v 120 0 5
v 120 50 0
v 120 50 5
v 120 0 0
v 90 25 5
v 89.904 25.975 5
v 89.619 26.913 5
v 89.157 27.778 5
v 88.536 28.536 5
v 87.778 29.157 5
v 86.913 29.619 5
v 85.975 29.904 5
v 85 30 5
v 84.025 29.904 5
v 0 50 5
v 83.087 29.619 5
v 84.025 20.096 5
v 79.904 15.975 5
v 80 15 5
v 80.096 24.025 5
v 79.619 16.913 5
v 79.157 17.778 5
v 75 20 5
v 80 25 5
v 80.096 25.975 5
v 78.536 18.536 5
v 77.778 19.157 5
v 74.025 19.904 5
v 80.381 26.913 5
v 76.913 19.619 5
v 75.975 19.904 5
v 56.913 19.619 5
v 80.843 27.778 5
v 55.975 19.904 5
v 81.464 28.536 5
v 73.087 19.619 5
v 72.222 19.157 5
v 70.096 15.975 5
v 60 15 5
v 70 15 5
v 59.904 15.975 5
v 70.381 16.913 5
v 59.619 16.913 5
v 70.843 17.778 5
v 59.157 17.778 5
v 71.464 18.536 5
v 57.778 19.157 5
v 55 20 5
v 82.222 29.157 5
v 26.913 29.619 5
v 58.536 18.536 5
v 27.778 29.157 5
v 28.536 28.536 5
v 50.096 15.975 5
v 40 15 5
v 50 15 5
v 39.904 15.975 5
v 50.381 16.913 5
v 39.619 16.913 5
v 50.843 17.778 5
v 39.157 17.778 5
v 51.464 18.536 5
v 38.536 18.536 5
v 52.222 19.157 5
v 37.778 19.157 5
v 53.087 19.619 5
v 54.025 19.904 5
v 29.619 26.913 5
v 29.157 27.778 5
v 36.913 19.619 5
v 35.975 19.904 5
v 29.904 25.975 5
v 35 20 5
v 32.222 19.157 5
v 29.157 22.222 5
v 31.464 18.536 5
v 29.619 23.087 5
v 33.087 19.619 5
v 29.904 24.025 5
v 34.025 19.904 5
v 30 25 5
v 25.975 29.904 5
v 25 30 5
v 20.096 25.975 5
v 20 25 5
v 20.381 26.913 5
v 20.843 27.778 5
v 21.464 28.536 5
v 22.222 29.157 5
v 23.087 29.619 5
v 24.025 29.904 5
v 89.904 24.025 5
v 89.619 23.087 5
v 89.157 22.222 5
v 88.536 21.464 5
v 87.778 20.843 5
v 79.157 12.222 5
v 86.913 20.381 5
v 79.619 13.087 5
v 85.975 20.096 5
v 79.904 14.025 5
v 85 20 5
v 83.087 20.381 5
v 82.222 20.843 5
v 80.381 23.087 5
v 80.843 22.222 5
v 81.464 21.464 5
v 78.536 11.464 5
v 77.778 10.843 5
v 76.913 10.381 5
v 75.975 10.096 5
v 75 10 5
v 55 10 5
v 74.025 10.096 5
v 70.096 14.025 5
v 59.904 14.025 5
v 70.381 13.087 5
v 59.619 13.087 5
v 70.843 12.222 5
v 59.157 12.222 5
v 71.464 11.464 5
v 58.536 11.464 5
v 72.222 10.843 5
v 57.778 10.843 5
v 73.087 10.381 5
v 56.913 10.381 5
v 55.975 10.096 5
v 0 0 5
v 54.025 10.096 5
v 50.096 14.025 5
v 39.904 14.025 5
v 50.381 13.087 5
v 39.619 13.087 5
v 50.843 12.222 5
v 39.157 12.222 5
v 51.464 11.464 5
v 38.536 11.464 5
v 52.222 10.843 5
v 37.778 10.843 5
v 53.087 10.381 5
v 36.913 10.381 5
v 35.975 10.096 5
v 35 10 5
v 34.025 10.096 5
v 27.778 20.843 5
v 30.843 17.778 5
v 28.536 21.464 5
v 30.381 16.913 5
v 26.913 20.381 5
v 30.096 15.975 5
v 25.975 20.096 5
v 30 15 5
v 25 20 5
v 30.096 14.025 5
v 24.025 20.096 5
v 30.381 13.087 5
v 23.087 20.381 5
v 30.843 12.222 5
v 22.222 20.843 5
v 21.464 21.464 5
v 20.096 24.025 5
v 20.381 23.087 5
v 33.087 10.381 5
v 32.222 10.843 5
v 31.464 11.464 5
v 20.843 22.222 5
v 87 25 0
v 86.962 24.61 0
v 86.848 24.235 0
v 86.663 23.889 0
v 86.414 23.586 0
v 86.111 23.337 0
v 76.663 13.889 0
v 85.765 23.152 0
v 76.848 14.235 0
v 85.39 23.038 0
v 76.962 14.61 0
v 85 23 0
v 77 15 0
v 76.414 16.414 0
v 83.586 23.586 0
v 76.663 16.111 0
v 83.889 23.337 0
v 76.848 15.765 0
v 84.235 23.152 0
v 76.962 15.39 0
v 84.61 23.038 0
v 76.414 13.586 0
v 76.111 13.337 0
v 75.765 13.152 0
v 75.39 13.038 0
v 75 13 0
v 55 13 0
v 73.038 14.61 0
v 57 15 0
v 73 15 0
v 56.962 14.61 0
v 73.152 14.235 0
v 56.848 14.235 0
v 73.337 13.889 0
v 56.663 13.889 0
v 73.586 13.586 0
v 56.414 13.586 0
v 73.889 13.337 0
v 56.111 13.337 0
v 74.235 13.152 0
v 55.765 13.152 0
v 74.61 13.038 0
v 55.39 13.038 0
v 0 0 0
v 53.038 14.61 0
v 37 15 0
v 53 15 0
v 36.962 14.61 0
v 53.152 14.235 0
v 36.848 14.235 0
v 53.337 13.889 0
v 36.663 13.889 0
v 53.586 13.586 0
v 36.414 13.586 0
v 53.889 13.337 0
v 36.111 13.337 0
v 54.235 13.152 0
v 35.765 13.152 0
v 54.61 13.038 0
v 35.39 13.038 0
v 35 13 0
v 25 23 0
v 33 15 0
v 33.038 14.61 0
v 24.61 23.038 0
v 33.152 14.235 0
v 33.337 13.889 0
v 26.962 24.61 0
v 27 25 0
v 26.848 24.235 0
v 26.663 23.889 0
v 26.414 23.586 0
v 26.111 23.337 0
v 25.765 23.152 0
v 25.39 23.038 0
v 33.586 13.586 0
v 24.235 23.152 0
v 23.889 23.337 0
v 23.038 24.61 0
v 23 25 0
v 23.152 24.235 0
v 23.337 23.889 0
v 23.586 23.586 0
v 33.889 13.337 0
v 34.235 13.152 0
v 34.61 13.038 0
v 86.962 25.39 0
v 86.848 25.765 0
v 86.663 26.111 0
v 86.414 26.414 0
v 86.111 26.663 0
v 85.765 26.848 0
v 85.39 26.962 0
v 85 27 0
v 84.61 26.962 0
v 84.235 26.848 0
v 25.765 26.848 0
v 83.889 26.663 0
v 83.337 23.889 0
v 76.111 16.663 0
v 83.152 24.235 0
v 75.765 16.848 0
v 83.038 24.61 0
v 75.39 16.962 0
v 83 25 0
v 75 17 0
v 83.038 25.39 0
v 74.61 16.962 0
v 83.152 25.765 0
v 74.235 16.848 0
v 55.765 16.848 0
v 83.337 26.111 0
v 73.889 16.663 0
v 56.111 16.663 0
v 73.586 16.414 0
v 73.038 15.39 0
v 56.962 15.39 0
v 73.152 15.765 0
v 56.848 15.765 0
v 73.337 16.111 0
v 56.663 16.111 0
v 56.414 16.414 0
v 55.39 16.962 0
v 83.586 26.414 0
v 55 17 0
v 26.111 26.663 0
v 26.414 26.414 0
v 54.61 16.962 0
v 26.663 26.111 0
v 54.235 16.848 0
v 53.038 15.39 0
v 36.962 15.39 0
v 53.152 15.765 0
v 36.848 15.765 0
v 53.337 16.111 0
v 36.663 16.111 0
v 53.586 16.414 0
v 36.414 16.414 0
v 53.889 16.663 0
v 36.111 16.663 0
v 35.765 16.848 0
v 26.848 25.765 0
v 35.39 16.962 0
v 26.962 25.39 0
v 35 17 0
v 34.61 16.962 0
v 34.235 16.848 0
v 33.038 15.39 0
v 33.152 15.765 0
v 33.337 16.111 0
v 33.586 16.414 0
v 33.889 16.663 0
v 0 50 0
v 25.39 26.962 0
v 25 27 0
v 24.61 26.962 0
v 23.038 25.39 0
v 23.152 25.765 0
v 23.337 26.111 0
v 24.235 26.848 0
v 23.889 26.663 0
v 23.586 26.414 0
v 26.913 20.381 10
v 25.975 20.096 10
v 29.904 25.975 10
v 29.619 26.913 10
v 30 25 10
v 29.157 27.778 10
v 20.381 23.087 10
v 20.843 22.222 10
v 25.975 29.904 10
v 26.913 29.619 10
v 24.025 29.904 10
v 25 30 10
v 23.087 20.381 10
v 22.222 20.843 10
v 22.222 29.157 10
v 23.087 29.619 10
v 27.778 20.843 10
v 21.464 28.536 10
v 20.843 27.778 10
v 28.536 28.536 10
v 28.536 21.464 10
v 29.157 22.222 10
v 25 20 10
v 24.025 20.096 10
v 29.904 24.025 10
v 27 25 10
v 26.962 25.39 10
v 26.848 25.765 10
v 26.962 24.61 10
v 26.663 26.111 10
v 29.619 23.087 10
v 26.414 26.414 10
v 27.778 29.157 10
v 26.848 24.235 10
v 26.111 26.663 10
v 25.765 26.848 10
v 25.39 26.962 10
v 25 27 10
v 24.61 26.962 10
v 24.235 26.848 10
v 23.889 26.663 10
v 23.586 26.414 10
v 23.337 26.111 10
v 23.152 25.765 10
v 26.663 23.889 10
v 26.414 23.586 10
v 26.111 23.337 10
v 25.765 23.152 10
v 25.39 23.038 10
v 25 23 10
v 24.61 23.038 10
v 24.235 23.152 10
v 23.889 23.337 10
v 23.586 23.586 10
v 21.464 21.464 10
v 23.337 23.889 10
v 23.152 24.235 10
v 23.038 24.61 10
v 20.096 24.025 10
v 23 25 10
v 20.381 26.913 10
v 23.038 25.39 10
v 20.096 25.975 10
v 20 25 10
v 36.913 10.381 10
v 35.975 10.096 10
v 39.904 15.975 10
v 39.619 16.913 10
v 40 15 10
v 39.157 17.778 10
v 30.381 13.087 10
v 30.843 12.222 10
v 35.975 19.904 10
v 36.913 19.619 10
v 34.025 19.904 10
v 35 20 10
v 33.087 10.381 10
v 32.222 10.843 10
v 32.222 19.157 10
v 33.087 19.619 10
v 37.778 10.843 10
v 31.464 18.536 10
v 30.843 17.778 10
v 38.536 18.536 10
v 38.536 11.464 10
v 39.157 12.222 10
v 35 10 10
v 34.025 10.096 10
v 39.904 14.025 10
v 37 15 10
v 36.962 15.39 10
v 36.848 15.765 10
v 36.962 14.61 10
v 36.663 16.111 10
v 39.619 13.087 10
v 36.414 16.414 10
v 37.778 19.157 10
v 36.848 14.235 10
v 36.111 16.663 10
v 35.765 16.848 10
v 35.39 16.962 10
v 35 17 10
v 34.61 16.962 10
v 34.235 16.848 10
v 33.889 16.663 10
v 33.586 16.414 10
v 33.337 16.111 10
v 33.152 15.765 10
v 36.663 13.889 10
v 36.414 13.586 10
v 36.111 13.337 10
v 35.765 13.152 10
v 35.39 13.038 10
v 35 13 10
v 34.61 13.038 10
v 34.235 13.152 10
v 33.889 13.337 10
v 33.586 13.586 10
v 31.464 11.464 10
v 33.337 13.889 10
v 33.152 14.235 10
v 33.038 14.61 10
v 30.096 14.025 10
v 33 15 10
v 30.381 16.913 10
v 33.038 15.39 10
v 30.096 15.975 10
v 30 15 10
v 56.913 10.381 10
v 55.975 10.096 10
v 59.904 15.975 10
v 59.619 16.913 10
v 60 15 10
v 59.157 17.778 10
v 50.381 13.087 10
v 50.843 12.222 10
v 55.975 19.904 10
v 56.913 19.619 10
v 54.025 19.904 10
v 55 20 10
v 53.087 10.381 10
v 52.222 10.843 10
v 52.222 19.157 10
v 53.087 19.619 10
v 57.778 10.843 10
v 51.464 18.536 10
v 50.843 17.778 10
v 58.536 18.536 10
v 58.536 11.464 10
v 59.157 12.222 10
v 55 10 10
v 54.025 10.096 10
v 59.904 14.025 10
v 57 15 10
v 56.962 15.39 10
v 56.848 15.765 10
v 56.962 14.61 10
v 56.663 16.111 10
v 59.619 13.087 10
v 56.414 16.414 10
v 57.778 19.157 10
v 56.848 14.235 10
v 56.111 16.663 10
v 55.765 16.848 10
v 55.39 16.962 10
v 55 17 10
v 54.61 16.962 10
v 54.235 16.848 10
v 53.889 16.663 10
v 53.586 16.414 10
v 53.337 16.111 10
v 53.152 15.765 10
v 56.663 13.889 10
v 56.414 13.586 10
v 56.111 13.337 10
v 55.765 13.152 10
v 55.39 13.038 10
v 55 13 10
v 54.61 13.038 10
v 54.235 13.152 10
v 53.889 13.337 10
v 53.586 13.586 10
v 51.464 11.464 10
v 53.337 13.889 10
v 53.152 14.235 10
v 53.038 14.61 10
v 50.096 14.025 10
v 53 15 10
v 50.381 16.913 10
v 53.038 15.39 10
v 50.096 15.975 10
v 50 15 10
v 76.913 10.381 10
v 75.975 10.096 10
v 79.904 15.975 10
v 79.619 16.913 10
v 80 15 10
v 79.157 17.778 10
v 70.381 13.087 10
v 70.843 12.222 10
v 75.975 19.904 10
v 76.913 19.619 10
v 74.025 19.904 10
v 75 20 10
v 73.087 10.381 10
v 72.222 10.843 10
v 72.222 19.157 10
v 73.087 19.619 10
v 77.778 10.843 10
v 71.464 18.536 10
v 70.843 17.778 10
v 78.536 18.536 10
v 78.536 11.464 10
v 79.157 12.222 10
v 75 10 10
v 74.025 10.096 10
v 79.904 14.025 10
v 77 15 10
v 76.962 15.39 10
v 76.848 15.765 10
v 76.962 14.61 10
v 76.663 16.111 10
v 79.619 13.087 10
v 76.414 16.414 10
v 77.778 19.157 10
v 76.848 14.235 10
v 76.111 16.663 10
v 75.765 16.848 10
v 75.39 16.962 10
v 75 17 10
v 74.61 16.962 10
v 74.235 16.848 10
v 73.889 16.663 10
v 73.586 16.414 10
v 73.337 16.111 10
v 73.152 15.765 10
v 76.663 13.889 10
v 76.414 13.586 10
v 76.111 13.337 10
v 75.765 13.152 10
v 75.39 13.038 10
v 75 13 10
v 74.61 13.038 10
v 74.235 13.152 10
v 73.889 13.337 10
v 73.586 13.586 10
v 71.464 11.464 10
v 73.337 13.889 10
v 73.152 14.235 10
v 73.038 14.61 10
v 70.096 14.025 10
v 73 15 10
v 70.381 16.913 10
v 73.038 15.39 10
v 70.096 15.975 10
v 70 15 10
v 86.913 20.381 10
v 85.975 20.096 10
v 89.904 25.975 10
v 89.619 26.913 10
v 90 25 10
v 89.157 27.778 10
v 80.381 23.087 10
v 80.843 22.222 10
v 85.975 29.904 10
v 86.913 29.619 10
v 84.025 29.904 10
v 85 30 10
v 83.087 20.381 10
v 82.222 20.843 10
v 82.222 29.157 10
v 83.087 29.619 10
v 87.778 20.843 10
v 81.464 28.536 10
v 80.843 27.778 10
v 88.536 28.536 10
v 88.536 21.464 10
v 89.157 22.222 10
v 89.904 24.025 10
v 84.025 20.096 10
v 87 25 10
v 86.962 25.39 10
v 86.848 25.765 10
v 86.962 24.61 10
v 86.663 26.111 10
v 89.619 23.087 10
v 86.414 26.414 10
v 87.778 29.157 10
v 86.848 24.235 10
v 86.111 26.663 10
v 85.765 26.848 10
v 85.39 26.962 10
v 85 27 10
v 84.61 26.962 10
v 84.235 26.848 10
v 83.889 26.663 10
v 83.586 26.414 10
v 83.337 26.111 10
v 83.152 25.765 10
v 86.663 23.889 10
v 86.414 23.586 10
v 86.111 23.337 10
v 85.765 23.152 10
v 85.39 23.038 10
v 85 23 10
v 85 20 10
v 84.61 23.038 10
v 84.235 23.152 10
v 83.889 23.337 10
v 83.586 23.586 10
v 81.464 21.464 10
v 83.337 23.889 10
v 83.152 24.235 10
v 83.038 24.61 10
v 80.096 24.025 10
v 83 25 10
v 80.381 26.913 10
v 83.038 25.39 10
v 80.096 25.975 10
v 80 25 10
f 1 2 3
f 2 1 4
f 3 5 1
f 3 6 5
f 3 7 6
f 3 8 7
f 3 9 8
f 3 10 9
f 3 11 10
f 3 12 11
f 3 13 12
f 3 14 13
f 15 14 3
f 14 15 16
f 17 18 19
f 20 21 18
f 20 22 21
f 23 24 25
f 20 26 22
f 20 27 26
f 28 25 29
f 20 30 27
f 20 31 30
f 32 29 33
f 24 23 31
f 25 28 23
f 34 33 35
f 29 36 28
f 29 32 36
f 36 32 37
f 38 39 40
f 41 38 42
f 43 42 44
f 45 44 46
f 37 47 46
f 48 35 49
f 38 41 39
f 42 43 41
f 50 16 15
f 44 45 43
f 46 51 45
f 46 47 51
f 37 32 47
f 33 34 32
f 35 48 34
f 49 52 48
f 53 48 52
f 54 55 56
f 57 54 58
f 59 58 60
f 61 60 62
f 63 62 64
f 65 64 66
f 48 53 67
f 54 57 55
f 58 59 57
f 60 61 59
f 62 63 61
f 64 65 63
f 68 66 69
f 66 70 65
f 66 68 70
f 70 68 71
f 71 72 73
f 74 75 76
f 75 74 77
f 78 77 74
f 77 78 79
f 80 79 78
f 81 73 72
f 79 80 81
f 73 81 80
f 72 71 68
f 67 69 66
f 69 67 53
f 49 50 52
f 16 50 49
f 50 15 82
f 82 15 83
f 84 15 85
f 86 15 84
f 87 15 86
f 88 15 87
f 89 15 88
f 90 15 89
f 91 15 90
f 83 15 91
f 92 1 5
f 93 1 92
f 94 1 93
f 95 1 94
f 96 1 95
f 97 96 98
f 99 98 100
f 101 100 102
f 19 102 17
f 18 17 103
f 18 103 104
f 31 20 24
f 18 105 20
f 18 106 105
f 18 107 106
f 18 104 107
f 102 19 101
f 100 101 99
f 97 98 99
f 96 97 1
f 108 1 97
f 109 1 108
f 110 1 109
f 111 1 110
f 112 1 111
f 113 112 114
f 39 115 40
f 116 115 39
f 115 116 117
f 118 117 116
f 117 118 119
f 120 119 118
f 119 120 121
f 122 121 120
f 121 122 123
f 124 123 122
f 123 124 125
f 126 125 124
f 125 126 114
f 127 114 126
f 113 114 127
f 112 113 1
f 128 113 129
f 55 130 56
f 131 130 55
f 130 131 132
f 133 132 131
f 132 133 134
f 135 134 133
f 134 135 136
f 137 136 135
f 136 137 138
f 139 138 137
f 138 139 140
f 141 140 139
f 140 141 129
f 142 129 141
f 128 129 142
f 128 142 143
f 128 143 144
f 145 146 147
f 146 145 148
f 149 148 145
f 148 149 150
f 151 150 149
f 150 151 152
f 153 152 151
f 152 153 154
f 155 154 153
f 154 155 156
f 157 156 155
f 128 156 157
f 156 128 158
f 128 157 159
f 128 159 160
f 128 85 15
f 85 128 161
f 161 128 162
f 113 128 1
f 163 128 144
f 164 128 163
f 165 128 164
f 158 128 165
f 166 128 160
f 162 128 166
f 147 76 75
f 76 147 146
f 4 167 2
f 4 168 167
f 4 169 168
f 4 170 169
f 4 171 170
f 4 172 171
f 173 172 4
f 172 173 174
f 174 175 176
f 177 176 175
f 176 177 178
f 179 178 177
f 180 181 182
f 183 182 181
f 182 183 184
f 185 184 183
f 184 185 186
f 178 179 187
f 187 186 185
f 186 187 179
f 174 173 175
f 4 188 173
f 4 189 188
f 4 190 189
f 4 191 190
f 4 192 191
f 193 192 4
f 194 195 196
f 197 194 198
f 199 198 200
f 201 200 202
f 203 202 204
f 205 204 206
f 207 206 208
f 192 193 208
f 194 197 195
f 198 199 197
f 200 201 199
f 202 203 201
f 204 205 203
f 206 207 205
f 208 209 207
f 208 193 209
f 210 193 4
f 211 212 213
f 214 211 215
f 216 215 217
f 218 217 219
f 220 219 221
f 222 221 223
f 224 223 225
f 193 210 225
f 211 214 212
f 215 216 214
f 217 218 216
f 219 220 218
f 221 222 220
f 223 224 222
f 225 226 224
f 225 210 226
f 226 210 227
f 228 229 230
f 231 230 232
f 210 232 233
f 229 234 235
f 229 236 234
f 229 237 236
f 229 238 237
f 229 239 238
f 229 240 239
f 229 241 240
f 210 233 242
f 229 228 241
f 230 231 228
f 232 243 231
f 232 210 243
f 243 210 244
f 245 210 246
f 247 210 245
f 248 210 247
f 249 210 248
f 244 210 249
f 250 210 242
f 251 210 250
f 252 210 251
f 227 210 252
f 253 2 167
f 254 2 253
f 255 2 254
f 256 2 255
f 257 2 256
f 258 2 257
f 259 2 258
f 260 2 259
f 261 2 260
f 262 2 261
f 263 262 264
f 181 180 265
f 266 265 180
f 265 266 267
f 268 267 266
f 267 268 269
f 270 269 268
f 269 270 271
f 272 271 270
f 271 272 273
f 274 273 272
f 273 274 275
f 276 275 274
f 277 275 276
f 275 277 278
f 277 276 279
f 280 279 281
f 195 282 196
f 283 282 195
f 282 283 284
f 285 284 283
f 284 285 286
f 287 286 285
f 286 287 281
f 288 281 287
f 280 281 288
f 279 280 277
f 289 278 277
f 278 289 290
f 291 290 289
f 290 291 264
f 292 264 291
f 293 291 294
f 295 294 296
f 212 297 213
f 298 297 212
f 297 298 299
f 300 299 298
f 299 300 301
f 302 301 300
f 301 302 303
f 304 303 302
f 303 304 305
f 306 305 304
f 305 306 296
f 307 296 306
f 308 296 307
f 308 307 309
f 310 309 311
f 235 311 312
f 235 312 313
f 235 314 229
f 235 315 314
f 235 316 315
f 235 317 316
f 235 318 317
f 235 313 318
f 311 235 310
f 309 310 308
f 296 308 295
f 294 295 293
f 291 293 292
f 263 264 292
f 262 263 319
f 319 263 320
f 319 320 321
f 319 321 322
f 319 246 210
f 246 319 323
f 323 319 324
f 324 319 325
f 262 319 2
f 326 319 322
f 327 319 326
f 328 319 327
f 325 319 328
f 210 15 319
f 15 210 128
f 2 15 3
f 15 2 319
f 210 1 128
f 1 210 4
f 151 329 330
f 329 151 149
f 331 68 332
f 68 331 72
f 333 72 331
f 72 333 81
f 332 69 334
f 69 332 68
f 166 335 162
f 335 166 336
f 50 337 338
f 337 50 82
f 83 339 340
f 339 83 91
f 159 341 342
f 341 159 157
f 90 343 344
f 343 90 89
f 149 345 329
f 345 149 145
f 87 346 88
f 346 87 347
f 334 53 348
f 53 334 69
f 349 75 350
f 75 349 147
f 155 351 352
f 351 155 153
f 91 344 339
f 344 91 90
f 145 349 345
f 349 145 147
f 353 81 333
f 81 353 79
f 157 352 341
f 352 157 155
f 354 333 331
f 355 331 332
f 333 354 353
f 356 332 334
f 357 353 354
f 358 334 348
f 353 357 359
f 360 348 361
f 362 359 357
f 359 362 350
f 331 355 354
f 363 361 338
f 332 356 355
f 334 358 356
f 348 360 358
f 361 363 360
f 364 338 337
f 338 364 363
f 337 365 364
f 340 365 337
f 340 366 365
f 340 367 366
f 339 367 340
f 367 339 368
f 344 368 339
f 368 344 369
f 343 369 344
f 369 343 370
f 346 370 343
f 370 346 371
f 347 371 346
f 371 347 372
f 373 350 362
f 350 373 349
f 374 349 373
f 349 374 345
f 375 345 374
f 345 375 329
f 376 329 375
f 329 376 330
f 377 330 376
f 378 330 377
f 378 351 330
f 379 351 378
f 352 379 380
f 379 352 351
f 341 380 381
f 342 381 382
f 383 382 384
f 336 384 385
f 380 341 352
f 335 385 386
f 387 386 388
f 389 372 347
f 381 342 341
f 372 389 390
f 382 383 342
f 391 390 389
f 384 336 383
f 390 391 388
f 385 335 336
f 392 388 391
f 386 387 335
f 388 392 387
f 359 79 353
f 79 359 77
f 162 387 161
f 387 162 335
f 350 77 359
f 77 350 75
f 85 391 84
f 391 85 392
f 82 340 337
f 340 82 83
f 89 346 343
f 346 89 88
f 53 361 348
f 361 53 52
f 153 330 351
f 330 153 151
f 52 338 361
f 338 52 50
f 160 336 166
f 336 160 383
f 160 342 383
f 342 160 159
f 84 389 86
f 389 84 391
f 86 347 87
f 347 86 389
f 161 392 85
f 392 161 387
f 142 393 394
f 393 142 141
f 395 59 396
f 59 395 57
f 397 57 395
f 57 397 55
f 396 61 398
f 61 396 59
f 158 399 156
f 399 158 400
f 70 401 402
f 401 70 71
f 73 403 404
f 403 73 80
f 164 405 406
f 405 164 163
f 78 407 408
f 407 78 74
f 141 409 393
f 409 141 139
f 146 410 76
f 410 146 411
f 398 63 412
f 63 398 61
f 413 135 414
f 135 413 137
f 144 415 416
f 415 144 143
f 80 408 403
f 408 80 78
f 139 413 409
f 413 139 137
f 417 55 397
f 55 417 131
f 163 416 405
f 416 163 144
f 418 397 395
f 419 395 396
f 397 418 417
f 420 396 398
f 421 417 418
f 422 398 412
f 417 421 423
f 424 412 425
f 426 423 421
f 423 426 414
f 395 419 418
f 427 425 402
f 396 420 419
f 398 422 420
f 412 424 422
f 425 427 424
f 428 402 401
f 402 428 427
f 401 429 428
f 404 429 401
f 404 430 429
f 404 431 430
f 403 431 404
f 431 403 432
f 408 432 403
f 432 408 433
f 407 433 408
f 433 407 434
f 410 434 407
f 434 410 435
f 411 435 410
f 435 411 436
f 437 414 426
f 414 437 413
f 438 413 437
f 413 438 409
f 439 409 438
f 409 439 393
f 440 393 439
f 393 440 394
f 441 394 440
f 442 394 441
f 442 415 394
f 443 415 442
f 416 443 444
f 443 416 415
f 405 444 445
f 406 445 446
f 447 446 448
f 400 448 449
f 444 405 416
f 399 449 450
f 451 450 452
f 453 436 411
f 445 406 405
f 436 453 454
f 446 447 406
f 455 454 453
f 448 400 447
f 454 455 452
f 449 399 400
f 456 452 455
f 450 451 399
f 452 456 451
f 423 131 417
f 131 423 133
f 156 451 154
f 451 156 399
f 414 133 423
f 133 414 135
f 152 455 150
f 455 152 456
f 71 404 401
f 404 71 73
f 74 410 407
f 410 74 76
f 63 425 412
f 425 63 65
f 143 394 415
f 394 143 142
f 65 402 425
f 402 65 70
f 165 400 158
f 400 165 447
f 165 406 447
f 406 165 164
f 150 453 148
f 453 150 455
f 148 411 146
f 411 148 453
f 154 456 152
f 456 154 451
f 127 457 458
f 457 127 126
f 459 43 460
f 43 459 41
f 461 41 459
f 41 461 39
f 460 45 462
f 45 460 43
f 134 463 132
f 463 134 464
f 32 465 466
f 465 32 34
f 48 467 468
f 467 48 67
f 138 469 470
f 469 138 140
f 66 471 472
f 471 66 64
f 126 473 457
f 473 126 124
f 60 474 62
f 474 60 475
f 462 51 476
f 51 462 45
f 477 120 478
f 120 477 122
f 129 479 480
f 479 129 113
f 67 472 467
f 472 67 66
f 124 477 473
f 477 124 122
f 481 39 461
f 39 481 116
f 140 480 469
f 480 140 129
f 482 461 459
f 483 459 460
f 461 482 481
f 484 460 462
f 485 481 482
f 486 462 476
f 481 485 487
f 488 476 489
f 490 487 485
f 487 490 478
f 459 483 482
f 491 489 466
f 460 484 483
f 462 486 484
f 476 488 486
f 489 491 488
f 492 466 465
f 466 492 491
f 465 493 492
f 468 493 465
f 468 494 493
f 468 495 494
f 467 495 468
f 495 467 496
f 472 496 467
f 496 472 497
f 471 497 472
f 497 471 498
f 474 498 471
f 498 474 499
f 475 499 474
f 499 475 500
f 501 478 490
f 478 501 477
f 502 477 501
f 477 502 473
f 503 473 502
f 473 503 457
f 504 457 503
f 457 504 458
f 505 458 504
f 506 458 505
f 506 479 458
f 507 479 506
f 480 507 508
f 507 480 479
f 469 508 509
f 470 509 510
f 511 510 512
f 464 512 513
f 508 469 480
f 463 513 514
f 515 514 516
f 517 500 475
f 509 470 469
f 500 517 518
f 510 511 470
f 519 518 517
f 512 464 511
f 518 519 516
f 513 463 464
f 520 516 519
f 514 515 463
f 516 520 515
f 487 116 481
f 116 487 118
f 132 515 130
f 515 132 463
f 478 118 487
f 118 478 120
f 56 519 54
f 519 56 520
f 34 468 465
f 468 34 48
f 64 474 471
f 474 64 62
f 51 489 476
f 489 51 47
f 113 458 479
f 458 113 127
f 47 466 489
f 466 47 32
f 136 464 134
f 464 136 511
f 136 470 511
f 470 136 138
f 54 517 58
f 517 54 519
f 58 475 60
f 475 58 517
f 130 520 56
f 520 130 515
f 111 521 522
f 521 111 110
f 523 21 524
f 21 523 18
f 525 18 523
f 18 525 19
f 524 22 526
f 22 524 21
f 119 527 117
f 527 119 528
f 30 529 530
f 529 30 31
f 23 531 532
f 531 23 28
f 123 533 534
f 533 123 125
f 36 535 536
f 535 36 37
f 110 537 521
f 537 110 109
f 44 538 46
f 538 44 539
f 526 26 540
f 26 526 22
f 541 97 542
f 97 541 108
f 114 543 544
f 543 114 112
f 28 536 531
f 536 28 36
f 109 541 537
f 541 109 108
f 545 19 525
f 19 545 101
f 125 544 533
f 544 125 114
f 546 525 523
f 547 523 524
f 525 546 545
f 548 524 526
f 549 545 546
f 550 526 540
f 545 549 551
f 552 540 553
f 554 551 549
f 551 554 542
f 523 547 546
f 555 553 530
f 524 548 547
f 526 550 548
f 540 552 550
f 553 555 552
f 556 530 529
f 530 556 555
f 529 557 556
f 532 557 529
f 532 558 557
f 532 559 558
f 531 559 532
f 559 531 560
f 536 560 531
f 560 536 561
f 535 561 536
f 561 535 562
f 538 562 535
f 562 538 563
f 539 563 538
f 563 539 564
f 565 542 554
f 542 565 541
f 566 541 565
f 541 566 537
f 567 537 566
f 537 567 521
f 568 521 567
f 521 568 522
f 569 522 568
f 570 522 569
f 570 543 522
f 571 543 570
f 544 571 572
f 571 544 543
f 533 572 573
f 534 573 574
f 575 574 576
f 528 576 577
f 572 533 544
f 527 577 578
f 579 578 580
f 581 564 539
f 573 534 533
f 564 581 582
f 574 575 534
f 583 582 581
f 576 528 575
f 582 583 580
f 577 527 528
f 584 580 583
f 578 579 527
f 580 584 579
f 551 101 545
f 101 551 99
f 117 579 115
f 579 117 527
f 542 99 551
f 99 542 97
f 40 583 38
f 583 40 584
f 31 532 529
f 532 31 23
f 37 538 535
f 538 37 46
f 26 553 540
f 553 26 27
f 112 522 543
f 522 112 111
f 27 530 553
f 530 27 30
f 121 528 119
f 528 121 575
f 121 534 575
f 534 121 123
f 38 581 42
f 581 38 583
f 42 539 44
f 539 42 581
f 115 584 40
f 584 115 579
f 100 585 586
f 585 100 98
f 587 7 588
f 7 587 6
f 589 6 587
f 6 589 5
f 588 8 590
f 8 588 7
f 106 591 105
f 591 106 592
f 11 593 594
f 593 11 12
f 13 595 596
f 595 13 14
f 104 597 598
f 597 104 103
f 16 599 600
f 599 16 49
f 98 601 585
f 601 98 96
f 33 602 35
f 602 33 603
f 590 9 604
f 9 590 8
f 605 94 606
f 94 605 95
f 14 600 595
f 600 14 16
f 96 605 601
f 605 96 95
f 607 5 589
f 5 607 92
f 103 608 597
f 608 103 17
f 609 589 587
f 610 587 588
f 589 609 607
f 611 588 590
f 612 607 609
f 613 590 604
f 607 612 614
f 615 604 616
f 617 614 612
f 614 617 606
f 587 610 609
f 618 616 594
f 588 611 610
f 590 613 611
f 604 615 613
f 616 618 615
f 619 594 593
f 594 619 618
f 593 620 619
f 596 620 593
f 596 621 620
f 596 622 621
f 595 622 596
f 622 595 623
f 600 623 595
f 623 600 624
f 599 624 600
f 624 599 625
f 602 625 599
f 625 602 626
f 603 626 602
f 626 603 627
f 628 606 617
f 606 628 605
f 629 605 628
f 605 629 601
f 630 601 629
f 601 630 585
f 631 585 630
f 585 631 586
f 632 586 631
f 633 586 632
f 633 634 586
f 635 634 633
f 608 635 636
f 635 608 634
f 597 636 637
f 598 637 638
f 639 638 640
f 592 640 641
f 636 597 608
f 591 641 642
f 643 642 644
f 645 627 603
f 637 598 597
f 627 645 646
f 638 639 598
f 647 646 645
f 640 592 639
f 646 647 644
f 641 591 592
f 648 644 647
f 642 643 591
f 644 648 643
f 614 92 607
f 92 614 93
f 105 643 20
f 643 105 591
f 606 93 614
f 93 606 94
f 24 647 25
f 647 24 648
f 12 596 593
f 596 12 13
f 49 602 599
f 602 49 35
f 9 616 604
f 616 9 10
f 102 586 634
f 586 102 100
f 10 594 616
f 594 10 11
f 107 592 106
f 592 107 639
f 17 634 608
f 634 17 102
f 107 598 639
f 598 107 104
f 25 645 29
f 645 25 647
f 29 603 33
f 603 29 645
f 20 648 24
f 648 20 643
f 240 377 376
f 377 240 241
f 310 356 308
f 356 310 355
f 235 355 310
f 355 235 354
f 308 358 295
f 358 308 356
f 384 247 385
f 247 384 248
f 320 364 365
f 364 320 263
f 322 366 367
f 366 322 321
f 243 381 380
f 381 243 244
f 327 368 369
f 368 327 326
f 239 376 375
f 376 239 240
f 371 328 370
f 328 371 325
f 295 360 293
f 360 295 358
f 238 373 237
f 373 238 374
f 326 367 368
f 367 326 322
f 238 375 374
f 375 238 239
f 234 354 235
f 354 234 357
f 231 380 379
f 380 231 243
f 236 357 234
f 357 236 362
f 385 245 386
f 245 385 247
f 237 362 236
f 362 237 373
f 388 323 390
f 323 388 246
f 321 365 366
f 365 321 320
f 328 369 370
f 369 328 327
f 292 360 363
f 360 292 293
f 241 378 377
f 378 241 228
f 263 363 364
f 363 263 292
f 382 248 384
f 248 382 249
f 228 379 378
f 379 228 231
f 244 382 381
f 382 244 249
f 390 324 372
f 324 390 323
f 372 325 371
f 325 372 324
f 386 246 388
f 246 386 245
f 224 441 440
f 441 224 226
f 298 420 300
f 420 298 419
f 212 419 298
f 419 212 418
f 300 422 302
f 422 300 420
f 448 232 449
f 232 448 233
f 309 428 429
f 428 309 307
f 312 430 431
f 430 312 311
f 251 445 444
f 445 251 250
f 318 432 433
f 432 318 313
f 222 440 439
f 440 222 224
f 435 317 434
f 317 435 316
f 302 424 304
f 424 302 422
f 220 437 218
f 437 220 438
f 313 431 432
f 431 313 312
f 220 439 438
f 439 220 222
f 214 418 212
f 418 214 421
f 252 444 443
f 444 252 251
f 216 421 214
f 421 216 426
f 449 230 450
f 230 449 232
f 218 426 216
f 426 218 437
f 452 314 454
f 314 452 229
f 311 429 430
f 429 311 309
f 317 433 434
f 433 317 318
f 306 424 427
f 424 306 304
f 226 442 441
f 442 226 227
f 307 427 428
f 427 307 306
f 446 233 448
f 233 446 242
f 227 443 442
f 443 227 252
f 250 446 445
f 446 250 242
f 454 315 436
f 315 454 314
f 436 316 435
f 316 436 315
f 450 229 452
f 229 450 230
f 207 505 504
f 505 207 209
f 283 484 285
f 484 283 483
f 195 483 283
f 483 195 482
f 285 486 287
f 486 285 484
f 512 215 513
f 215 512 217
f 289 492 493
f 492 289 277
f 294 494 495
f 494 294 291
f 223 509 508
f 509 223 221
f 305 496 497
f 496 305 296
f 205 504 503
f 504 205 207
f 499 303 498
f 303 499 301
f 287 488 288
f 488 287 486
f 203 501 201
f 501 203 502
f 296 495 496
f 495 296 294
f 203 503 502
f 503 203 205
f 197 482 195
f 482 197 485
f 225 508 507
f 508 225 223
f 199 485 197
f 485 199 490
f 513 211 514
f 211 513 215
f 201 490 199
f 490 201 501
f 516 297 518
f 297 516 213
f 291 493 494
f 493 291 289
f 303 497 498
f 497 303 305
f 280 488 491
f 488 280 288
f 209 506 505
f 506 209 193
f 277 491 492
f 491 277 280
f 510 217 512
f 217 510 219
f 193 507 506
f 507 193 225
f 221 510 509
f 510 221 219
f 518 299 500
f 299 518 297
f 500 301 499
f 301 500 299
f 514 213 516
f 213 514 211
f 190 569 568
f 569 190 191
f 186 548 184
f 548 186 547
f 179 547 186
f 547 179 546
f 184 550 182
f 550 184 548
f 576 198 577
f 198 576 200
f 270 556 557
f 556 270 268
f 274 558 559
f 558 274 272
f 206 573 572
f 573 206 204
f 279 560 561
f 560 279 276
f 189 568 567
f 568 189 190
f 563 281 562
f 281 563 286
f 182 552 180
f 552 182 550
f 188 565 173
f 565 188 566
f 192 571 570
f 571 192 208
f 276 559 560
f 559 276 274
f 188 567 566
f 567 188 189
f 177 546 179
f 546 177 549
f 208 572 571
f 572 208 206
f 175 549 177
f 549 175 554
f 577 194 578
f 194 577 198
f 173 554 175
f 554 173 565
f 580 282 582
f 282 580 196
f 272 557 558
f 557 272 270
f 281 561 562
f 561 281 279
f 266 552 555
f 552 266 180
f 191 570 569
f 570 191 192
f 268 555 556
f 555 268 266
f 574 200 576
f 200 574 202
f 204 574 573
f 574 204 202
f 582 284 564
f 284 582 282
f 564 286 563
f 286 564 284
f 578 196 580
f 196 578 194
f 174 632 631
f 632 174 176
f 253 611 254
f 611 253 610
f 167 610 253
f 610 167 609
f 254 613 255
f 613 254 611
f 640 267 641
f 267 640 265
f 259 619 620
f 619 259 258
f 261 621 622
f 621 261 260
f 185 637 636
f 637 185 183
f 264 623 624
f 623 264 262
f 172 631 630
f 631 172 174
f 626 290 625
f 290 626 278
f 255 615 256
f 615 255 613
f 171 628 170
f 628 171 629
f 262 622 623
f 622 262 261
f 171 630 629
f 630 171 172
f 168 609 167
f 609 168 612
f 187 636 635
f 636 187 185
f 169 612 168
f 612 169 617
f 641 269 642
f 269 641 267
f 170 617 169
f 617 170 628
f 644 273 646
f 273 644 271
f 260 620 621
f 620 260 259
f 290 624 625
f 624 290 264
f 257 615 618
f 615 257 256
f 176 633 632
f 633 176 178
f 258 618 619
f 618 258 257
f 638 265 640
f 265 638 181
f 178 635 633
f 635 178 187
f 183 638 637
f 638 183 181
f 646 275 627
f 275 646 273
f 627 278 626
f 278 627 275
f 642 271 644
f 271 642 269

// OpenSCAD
$fn = 32;
// target_bbox: 120, 50, 10
// ----------------------------------------------------------------------
// Boss field: plate with bosses at given coordinates
// ----------------------------------------------------------------------

// --- parameters (mm) ---
plate_l = 120;            // plate length, X
plate_w = 50;             // plate width, Y
plate_t = 5;              // plate thickness, Z
boss_d = 10;              // boss diameter
boss_h = 5;               // boss height above the plate
bore_d = 4;               // boss bore

total_h = plate_t + boss_h;  // overall height

difference() {
  union() {
    cube([plate_l, plate_w, plate_t]);
    translate([25, 25, plate_t]) cylinder(h = boss_h, d = boss_d);
    translate([35, 15, plate_t]) cylinder(h = boss_h, d = boss_d);
    translate([55, 15, plate_t]) cylinder(h = boss_h, d = boss_d);
    translate([75, 15, plate_t]) cylinder(h = boss_h, d = boss_d);
    translate([85, 25, plate_t]) cylinder(h = boss_h, d = boss_d);
  }
  translate([25, 25, -1]) cylinder(h = total_h + 2, d = bore_d);
  translate([35, 15, -1]) cylinder(h = total_h + 2, d = bore_d);
  translate([55, 15, -1]) cylinder(h = total_h + 2, d = bore_d);
  translate([75, 15, -1]) cylinder(h = total_h + 2, d = bore_d);
  translate([85, 25, -1]) cylinder(h = total_h + 2, d = bore_d);
}
